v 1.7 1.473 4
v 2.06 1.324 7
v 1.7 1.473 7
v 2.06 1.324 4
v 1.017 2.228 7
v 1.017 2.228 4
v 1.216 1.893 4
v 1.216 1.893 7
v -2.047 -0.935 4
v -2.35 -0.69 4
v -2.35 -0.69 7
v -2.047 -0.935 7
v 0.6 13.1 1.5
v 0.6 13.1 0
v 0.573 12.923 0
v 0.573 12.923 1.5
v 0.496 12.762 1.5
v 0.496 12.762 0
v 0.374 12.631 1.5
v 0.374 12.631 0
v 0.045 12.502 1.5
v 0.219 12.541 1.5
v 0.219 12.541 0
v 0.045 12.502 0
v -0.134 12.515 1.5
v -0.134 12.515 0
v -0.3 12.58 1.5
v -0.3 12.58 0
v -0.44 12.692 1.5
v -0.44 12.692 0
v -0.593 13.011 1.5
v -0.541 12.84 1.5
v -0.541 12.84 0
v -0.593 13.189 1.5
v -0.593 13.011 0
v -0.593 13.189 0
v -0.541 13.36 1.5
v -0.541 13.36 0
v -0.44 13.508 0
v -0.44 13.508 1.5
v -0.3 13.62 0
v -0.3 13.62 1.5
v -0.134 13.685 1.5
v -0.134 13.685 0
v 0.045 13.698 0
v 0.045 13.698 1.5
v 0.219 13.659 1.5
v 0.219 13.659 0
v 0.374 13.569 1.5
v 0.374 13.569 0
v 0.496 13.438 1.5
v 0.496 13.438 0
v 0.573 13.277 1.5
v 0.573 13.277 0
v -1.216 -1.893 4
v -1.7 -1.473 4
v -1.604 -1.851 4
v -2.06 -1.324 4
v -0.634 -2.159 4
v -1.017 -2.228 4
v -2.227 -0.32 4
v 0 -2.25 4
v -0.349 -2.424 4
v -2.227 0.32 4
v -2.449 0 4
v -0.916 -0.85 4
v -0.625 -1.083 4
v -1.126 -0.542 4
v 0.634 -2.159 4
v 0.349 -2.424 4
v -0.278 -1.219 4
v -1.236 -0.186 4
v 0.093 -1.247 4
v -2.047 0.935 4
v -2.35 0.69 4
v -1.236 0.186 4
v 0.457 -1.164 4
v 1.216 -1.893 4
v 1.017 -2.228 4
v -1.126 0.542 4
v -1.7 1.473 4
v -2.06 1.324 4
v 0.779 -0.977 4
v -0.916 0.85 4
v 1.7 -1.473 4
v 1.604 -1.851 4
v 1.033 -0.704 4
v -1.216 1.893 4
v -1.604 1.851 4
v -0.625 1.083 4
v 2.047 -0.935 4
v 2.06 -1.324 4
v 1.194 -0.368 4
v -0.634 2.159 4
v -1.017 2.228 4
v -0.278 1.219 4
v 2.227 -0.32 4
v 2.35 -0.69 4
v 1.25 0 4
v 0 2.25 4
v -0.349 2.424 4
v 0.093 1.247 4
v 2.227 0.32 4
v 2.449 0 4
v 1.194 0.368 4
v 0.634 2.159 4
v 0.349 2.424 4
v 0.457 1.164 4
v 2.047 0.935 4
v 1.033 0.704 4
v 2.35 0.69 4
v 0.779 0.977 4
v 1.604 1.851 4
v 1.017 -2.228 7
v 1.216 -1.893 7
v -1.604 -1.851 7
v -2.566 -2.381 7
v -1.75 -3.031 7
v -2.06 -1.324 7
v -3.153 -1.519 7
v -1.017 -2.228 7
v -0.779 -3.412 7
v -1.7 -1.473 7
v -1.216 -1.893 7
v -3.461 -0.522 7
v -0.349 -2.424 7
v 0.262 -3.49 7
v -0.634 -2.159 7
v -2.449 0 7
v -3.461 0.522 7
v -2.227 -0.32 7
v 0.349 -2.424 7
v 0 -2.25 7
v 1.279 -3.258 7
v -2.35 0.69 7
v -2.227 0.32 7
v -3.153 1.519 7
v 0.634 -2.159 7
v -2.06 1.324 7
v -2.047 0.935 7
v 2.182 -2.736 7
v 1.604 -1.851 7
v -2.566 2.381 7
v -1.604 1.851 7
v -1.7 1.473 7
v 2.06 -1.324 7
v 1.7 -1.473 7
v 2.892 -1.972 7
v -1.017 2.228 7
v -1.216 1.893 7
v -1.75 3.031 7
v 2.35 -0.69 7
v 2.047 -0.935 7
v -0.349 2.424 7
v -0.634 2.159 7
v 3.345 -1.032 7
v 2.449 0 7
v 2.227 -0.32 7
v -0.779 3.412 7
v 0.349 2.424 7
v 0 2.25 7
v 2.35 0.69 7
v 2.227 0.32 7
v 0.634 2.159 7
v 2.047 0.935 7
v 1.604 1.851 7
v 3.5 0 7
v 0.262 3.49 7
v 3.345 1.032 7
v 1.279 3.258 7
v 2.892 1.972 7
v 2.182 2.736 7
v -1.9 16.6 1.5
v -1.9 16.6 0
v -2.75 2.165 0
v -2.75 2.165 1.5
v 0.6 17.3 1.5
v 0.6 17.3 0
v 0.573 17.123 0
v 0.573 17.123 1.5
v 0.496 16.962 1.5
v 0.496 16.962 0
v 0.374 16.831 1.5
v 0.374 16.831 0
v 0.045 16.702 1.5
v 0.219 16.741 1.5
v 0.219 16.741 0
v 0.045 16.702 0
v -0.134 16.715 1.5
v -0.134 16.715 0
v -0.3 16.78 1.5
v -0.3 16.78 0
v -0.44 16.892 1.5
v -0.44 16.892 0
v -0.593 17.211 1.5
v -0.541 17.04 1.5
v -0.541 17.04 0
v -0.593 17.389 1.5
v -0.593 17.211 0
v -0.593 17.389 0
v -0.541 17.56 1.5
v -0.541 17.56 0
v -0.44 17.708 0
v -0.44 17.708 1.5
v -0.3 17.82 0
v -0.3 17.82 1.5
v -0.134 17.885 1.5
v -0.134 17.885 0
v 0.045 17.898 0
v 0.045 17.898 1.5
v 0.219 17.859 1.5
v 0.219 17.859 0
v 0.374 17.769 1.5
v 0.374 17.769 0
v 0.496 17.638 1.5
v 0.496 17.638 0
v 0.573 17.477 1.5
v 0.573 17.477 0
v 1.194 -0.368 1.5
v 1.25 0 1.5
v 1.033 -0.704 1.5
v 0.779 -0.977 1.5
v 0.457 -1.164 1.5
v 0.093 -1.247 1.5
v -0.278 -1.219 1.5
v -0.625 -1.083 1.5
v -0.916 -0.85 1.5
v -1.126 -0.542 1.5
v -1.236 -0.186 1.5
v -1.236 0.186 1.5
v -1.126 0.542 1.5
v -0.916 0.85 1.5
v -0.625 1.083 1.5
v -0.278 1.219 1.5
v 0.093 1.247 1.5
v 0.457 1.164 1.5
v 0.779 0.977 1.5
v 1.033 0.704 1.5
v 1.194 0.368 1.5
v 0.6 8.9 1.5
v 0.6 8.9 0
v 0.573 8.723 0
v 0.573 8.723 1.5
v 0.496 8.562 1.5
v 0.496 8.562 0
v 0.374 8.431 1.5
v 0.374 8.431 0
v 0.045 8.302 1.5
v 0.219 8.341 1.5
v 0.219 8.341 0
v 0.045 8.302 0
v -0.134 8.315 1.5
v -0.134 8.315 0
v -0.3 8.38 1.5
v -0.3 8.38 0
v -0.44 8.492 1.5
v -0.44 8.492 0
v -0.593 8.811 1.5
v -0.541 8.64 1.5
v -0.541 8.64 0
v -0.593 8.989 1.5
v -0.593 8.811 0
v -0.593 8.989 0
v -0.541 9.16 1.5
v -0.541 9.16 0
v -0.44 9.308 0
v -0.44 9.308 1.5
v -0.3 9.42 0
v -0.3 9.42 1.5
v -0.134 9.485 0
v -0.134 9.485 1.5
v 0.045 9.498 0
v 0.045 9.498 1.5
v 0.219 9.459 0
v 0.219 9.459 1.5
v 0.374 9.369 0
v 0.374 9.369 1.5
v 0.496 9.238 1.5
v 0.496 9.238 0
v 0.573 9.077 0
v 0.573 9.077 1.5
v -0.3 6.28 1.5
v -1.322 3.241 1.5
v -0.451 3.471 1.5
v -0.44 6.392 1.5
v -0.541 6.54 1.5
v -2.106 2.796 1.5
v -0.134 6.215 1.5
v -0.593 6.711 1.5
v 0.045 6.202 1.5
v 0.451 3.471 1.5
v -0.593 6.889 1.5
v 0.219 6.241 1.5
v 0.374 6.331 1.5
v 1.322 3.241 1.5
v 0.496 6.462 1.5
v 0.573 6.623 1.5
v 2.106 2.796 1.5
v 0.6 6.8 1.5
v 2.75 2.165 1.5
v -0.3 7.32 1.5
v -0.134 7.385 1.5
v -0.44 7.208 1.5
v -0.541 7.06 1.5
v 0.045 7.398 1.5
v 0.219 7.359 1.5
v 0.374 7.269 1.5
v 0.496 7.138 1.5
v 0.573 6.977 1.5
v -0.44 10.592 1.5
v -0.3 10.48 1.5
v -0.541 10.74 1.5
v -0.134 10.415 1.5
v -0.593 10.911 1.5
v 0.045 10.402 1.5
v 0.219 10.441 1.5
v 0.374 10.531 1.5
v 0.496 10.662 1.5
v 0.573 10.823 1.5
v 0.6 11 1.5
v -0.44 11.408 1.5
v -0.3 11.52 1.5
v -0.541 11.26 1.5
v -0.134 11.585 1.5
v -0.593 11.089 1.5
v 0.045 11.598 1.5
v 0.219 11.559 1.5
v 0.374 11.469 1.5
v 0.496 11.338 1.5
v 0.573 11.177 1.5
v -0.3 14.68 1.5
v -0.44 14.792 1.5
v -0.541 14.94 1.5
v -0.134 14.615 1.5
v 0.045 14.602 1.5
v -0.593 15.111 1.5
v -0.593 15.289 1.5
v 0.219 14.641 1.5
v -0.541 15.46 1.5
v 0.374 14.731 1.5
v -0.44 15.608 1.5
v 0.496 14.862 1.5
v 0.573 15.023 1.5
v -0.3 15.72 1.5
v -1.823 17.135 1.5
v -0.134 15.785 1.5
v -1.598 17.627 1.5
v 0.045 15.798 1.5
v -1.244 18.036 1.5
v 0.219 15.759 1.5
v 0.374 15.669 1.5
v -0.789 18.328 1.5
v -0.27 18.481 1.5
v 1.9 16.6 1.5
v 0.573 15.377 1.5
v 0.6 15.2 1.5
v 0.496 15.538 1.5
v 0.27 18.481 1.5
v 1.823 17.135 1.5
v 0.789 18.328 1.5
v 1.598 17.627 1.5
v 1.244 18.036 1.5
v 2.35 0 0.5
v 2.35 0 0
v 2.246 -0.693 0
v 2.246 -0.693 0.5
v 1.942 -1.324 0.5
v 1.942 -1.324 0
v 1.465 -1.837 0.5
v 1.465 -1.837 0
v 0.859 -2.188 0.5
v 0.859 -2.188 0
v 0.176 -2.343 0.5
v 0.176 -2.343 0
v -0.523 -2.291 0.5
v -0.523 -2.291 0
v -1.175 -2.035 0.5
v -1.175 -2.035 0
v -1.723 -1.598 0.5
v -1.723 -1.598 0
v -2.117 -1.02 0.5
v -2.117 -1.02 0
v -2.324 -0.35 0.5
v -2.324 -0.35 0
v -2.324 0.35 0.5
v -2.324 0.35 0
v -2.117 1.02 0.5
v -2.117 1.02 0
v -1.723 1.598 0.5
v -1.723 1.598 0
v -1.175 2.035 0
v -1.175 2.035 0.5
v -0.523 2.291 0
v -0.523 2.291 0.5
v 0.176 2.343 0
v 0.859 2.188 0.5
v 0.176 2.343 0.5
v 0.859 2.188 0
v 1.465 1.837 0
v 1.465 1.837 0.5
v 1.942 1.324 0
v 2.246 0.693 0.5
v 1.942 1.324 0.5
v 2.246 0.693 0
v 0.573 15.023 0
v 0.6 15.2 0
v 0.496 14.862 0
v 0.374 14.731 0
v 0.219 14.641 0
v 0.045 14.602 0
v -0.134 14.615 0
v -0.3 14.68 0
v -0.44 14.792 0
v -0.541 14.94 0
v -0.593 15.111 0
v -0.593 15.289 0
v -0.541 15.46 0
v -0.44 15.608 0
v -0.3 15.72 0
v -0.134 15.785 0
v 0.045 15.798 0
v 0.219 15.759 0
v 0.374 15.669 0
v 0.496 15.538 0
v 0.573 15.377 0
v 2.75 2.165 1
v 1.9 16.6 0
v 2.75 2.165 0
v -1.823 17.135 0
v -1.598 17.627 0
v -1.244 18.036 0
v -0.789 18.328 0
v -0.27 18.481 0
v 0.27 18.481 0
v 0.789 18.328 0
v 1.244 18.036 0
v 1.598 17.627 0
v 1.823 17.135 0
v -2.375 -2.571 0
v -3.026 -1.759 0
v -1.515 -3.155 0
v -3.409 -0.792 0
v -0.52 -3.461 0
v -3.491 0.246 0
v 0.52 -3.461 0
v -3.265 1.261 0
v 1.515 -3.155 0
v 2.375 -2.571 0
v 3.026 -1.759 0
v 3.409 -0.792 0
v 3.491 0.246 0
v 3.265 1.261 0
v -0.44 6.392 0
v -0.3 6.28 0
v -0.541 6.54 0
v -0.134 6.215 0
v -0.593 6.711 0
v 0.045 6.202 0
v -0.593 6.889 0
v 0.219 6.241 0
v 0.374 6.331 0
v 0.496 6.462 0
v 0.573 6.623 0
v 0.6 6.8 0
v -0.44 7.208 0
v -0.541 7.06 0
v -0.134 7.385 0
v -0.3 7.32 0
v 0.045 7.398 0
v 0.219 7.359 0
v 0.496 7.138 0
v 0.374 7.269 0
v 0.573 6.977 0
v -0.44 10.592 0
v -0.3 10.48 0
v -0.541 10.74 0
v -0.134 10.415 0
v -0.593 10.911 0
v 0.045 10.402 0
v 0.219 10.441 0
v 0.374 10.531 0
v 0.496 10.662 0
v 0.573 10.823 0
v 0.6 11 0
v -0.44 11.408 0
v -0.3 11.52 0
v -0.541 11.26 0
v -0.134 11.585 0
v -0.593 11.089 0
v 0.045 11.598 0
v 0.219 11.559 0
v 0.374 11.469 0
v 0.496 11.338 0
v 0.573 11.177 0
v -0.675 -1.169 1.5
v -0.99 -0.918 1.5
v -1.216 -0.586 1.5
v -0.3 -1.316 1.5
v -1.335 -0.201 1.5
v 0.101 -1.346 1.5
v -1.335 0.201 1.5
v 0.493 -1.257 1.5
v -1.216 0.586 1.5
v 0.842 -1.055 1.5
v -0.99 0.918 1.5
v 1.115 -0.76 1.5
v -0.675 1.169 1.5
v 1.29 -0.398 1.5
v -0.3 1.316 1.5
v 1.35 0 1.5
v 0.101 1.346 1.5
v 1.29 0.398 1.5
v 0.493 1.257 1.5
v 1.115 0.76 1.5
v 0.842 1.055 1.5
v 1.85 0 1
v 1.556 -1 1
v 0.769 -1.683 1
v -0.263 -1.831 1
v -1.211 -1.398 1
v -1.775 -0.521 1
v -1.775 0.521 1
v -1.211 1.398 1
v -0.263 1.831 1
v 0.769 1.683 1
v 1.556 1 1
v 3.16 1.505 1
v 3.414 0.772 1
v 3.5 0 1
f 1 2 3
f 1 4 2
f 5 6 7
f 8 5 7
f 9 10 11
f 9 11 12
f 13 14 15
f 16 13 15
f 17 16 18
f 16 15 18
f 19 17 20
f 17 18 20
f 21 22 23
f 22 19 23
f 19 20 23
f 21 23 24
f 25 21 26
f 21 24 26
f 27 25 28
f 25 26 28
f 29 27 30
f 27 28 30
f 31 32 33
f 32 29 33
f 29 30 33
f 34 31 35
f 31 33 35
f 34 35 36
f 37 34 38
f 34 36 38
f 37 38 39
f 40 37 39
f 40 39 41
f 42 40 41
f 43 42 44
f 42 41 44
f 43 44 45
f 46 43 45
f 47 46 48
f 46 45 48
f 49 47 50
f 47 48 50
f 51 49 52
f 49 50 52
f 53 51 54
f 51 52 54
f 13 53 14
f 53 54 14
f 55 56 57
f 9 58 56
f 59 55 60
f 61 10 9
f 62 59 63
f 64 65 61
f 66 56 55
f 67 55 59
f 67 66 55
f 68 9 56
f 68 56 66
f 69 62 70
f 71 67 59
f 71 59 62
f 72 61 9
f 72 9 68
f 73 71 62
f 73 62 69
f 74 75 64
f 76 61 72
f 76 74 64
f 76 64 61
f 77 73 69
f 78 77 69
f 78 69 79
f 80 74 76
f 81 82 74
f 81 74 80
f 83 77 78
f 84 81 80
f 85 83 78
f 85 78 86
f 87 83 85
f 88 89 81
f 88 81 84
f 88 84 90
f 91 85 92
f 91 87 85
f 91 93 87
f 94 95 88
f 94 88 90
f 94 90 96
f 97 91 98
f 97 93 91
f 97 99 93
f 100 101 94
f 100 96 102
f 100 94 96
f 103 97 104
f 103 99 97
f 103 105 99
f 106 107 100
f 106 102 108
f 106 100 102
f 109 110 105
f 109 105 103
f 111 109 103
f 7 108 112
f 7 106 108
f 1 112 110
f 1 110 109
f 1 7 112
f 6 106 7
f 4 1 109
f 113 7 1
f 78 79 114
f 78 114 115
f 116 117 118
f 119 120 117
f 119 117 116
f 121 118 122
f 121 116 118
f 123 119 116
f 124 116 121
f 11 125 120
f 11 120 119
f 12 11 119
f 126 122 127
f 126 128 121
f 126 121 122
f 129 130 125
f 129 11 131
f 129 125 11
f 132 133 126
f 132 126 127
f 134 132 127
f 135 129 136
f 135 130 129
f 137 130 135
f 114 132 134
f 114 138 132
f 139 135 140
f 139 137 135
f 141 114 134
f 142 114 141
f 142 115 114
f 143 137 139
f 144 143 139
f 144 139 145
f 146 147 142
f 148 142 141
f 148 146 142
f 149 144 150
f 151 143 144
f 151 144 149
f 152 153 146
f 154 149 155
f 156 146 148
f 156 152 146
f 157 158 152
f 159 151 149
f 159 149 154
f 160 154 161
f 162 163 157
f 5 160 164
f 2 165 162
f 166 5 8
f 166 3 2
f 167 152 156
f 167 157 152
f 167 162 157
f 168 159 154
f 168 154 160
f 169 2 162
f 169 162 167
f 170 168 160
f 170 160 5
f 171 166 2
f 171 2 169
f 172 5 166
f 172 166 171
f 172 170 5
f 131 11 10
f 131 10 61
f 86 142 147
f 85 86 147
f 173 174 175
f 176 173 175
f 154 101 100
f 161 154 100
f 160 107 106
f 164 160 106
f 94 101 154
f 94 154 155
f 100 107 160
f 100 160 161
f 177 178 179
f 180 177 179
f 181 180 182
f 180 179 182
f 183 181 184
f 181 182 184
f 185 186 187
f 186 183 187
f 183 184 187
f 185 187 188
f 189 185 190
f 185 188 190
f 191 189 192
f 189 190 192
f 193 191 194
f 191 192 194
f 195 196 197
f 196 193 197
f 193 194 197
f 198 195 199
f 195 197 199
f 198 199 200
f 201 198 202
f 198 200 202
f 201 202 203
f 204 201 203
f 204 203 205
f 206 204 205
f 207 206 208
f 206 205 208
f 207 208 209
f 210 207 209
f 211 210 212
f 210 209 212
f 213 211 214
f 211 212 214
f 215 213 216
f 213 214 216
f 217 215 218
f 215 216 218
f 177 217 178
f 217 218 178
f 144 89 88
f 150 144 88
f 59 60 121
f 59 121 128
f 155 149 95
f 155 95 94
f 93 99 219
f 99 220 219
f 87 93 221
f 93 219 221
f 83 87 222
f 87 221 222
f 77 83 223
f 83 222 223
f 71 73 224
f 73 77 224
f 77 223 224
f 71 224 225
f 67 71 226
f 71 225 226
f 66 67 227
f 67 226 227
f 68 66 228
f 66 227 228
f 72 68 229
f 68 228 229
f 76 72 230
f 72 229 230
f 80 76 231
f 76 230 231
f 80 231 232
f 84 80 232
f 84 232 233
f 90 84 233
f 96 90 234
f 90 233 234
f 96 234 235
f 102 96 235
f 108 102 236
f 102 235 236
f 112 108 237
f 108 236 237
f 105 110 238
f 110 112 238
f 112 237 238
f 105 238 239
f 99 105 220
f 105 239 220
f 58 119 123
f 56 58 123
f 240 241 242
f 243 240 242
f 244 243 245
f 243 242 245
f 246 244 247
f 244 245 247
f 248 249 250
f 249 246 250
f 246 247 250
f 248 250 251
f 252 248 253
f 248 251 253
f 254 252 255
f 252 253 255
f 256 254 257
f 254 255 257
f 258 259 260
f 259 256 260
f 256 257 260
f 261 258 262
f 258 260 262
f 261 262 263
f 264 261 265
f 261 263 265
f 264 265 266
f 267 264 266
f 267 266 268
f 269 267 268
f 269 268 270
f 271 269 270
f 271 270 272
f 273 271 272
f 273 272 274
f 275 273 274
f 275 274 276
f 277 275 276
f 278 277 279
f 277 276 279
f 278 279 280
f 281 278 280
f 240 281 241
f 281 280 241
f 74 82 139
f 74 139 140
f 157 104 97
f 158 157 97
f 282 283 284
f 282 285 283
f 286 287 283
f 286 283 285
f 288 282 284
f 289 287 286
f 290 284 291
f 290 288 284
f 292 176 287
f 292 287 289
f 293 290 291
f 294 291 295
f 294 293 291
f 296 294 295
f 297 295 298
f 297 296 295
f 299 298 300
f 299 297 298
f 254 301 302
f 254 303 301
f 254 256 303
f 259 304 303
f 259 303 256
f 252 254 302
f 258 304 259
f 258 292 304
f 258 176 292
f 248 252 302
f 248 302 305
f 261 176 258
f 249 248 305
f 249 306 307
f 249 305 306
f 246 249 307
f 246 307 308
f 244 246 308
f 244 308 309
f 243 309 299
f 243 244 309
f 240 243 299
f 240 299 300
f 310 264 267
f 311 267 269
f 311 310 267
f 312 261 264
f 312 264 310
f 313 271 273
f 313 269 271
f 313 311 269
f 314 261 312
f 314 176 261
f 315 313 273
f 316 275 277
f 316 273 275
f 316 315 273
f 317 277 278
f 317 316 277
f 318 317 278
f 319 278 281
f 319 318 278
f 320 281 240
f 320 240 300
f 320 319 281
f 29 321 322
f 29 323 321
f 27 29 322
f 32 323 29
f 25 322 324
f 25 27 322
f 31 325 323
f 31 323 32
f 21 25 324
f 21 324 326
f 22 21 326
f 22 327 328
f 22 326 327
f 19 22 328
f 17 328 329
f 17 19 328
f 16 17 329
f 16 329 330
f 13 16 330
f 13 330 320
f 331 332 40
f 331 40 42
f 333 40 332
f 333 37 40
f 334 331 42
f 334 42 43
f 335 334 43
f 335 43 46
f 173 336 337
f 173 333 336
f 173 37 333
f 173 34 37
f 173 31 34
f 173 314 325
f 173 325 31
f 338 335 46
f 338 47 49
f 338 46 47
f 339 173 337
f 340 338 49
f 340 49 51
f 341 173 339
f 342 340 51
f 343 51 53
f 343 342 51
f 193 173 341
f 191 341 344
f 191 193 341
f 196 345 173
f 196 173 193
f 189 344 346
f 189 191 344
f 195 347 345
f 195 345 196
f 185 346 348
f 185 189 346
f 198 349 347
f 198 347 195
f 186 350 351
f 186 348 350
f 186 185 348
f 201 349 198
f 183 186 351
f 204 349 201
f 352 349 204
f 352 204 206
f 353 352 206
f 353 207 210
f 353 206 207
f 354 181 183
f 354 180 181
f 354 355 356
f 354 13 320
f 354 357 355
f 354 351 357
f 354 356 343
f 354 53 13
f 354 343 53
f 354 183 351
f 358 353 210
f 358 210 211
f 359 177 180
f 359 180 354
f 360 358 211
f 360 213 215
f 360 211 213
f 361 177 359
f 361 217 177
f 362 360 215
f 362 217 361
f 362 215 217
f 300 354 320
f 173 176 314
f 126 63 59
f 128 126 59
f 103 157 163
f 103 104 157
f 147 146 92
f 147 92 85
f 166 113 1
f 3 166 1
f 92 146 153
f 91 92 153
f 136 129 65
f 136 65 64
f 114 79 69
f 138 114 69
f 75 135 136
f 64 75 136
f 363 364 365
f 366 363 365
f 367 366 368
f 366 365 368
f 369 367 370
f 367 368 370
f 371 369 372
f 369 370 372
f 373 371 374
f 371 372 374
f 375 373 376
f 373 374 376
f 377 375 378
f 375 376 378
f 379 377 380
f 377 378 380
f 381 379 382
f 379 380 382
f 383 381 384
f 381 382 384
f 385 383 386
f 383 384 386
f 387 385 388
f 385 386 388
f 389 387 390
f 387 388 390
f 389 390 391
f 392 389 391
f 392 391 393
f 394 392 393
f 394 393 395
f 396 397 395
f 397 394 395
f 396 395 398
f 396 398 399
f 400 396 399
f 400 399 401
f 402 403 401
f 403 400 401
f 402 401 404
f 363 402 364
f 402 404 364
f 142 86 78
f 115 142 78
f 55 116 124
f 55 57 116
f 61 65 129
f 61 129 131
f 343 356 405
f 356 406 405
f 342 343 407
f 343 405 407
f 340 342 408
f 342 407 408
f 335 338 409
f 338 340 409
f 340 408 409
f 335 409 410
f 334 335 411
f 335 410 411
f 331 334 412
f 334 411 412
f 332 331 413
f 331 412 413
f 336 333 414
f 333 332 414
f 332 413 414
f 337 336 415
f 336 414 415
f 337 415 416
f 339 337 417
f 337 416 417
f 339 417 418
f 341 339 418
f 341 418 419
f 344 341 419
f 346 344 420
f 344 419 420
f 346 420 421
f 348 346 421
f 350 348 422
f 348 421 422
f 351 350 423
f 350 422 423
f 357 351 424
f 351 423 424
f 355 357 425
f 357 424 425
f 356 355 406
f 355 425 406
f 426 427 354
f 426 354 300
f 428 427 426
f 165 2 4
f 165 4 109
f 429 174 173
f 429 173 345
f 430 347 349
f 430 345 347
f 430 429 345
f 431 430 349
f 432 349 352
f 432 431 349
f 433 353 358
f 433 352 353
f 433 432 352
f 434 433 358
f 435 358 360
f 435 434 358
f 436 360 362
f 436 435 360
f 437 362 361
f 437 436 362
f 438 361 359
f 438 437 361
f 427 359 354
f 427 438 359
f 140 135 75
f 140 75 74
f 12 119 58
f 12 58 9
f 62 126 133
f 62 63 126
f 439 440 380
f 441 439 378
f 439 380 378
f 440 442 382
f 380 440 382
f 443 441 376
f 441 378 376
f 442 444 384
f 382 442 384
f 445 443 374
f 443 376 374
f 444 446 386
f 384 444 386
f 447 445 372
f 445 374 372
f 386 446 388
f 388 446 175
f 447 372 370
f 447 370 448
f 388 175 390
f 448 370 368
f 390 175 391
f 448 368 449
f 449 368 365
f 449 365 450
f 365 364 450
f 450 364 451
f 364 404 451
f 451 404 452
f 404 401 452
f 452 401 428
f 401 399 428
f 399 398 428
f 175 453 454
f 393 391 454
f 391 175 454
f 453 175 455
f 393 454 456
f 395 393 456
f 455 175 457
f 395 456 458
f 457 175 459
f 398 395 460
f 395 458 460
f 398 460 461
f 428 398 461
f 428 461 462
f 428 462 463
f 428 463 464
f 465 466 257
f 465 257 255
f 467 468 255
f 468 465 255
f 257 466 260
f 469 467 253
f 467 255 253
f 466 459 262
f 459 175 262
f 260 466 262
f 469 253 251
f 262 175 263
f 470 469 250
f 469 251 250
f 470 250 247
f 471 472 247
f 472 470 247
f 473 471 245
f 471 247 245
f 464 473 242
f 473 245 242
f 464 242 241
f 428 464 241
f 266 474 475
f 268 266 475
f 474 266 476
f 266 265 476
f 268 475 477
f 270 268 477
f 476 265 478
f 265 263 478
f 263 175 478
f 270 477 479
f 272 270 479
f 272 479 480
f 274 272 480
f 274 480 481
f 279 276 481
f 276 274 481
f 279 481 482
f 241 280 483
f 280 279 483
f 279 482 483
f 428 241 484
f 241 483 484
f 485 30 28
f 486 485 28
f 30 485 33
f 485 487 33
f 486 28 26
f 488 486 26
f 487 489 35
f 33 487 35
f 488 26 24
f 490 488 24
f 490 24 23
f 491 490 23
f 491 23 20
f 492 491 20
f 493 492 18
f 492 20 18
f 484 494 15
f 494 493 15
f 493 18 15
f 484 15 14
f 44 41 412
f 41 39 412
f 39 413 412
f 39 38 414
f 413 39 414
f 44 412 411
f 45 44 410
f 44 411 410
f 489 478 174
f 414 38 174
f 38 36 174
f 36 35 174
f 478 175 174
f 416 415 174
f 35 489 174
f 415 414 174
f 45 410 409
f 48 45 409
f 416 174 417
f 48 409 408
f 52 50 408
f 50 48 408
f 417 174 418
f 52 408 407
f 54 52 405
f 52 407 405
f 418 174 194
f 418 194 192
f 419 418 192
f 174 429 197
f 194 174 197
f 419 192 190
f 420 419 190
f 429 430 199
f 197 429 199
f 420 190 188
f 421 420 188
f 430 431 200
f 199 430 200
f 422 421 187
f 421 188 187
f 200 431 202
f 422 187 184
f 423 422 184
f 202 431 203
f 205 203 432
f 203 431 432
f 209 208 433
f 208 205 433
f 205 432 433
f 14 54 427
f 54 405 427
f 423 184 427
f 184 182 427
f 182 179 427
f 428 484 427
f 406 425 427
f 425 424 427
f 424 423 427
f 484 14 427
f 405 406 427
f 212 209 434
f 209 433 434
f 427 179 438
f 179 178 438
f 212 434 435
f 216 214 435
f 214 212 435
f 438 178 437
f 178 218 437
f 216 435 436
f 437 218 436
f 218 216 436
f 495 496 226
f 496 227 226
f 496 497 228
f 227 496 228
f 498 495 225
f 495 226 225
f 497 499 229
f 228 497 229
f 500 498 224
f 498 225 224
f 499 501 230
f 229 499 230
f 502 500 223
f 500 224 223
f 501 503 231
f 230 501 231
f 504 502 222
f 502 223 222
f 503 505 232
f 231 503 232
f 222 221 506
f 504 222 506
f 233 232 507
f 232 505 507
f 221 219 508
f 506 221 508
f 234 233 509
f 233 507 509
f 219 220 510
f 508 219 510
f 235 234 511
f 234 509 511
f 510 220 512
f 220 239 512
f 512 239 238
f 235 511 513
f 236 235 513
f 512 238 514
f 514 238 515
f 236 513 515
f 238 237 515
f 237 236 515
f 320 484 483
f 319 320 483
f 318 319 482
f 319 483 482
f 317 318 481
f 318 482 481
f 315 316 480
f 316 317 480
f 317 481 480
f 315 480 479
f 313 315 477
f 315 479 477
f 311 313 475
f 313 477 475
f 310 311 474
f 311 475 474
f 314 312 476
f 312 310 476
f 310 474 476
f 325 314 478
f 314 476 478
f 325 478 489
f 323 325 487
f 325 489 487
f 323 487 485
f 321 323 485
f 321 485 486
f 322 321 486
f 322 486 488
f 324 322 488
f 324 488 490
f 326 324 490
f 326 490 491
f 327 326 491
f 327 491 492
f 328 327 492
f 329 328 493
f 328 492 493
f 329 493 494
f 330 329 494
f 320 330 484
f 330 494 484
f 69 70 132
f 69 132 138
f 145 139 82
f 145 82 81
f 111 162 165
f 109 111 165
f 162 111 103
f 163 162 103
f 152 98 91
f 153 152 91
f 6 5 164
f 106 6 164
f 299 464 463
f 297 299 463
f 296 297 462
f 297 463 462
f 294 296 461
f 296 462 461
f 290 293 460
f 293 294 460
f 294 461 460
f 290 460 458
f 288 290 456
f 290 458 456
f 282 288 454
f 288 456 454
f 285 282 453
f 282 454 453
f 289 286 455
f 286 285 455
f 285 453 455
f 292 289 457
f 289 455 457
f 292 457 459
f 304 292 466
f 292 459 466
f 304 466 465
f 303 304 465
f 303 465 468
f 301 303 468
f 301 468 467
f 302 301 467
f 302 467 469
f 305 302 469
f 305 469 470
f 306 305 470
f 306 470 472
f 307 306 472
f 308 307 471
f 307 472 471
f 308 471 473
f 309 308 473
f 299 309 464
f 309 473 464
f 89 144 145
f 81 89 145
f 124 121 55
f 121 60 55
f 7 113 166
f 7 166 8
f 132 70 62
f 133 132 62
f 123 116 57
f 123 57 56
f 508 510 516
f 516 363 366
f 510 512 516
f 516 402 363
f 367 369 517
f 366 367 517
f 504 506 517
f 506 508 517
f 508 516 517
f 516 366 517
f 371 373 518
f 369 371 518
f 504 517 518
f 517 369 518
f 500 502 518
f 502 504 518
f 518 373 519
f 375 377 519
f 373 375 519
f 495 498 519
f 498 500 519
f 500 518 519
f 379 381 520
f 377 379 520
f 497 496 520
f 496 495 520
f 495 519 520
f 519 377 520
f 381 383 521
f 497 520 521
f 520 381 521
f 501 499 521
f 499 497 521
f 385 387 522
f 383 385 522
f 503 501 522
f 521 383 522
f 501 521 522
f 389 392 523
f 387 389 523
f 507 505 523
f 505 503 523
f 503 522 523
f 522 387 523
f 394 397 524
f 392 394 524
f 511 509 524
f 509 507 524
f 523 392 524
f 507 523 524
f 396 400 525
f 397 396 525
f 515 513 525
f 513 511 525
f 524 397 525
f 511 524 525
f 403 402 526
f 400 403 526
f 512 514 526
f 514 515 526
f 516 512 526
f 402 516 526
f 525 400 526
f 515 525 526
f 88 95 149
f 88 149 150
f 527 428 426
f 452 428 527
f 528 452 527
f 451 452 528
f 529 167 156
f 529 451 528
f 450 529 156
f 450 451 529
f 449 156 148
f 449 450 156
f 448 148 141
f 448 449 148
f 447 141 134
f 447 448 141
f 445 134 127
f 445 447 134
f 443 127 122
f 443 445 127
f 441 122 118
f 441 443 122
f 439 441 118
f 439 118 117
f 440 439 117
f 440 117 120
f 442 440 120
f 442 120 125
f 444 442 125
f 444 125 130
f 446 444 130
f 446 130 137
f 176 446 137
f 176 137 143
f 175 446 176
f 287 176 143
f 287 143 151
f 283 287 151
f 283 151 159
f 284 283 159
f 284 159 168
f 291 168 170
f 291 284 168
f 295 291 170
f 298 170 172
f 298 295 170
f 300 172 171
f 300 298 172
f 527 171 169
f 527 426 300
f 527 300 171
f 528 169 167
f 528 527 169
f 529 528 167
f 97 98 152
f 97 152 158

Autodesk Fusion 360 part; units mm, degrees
sketch "スケッチ1" plane through (0, 0, 0) normal (0, 0, 1) x (1, 0, 0)
  circle A0 centre (0, 0) radius 2.45
  circle A1 centre (0, 0) radius 3.5
  line L0 (-3.5, 0) -> (3.5, 0) construction
  line L1 (0, 3.5) -> (0, -3.5) construction
  line L2 (-0.35, 2.4249) -> (0, 2.25)
  line L3 (0.35, 2.4249) -> (0, 2.25)
  line L4 (-0.35, 2.4249) -> (0.35, 2.4249) construction
  line L5 (0, 2.45) -> (0, 2.25) construction
  circle A2 centre (0, 0) radius 1.25
  line L6 (0, 3.5) -> (0, 18.5) construction
  line L7 (-2.75, 2.1651) -> (2.75, 2.1651) construction
  circle A3 centre (0, 16.6) radius 1.9
  line L8 (-1.9, 16.6) -> (1.9, 16.6) construction
  line L9 (-1.9, 16.6) -> (-2.75, 2.1651)
  line L10 (1.9, 16.6) -> (2.75, 2.1651)
  circle A4 centre (0, 17.3) radius 0.6
  circle A5 centre (0, 15.2) radius 0.6
  circle A6 centre (0, 13.1) radius 0.6
  circle A7 centre (0, 11) radius 0.6
  circle A8 centre (0, 8.9) radius 0.6
  circle A9 centre (0, 6.8) radius 0.6
  circle A10 centre (0, 0) radius 2.35
  dimension "d1" = 4.9
  dimension "d2" = 7
  dimension "d3" = 0.2
  dimension "d4" = 0.7
  dimension "d5" = 2.5
  dimension "d7" = 3.8
  dimension "d8" = 22
  dimension "d9" = 5.5
  dimension "d10" = 1.2
  dimension "d12" = 2.1
  dimension "d13" = 2.1
  dimension "d14" = 2.1
  dimension "d15" = 2.1
  dimension "d16" = 2.1
  dimension "d18" = 4.7
  dimension "d21" = 1.2
extrude "押し出し1" add sketch "スケッチ1" along normal blind 1 contours A0 L2 L3 A10 | A0 L2 L3 A10 | L2 L3 A10 | L2 L3 A10 | A1 | A1 A3 L9 L10 A5 | A3 A5 picked at (0.9036, 16.1951)
extrude "押し出し2" add sketch "スケッチ1" along normal blind 1.5 contours A1 A3 L9 L10 A5 | A3 A5 picked at (0.9036, 16.1951)
extrude "押し出し3" add sketch "スケッチ1" along normal blind 3 from surface at 1 contours A0 L2 L3 A10 | A0 L2 L3 A10 | L2 L3 A10 | L2 L3 A10 | A1
extrude "押し出し4" add sketch "スケッチ1" along normal blind 3 from surface at 4 contours A1
extrude "押し出し5" add sketch "スケッチ1" along normal blind 3 from surface at 4 contours A0 L2 L3 A10 | L2 L3 A10 picked at (-0.2175, 2.4049) picked at (0, 2.3161)
pattern_circular "C パターン1" count 22 over 360 about axis through (0, 0, 1.75) along (0, 0, 1) of "押し出し5"
extrude "押し出し6" cut sketch "スケッチ1" along normal blind 1.5 contours L2 L3 A10 | L2 L3 A10
chamfer "面取り1" distance 1 angle 45 1 edges at (-2.191, -0.8498, 1.5)
